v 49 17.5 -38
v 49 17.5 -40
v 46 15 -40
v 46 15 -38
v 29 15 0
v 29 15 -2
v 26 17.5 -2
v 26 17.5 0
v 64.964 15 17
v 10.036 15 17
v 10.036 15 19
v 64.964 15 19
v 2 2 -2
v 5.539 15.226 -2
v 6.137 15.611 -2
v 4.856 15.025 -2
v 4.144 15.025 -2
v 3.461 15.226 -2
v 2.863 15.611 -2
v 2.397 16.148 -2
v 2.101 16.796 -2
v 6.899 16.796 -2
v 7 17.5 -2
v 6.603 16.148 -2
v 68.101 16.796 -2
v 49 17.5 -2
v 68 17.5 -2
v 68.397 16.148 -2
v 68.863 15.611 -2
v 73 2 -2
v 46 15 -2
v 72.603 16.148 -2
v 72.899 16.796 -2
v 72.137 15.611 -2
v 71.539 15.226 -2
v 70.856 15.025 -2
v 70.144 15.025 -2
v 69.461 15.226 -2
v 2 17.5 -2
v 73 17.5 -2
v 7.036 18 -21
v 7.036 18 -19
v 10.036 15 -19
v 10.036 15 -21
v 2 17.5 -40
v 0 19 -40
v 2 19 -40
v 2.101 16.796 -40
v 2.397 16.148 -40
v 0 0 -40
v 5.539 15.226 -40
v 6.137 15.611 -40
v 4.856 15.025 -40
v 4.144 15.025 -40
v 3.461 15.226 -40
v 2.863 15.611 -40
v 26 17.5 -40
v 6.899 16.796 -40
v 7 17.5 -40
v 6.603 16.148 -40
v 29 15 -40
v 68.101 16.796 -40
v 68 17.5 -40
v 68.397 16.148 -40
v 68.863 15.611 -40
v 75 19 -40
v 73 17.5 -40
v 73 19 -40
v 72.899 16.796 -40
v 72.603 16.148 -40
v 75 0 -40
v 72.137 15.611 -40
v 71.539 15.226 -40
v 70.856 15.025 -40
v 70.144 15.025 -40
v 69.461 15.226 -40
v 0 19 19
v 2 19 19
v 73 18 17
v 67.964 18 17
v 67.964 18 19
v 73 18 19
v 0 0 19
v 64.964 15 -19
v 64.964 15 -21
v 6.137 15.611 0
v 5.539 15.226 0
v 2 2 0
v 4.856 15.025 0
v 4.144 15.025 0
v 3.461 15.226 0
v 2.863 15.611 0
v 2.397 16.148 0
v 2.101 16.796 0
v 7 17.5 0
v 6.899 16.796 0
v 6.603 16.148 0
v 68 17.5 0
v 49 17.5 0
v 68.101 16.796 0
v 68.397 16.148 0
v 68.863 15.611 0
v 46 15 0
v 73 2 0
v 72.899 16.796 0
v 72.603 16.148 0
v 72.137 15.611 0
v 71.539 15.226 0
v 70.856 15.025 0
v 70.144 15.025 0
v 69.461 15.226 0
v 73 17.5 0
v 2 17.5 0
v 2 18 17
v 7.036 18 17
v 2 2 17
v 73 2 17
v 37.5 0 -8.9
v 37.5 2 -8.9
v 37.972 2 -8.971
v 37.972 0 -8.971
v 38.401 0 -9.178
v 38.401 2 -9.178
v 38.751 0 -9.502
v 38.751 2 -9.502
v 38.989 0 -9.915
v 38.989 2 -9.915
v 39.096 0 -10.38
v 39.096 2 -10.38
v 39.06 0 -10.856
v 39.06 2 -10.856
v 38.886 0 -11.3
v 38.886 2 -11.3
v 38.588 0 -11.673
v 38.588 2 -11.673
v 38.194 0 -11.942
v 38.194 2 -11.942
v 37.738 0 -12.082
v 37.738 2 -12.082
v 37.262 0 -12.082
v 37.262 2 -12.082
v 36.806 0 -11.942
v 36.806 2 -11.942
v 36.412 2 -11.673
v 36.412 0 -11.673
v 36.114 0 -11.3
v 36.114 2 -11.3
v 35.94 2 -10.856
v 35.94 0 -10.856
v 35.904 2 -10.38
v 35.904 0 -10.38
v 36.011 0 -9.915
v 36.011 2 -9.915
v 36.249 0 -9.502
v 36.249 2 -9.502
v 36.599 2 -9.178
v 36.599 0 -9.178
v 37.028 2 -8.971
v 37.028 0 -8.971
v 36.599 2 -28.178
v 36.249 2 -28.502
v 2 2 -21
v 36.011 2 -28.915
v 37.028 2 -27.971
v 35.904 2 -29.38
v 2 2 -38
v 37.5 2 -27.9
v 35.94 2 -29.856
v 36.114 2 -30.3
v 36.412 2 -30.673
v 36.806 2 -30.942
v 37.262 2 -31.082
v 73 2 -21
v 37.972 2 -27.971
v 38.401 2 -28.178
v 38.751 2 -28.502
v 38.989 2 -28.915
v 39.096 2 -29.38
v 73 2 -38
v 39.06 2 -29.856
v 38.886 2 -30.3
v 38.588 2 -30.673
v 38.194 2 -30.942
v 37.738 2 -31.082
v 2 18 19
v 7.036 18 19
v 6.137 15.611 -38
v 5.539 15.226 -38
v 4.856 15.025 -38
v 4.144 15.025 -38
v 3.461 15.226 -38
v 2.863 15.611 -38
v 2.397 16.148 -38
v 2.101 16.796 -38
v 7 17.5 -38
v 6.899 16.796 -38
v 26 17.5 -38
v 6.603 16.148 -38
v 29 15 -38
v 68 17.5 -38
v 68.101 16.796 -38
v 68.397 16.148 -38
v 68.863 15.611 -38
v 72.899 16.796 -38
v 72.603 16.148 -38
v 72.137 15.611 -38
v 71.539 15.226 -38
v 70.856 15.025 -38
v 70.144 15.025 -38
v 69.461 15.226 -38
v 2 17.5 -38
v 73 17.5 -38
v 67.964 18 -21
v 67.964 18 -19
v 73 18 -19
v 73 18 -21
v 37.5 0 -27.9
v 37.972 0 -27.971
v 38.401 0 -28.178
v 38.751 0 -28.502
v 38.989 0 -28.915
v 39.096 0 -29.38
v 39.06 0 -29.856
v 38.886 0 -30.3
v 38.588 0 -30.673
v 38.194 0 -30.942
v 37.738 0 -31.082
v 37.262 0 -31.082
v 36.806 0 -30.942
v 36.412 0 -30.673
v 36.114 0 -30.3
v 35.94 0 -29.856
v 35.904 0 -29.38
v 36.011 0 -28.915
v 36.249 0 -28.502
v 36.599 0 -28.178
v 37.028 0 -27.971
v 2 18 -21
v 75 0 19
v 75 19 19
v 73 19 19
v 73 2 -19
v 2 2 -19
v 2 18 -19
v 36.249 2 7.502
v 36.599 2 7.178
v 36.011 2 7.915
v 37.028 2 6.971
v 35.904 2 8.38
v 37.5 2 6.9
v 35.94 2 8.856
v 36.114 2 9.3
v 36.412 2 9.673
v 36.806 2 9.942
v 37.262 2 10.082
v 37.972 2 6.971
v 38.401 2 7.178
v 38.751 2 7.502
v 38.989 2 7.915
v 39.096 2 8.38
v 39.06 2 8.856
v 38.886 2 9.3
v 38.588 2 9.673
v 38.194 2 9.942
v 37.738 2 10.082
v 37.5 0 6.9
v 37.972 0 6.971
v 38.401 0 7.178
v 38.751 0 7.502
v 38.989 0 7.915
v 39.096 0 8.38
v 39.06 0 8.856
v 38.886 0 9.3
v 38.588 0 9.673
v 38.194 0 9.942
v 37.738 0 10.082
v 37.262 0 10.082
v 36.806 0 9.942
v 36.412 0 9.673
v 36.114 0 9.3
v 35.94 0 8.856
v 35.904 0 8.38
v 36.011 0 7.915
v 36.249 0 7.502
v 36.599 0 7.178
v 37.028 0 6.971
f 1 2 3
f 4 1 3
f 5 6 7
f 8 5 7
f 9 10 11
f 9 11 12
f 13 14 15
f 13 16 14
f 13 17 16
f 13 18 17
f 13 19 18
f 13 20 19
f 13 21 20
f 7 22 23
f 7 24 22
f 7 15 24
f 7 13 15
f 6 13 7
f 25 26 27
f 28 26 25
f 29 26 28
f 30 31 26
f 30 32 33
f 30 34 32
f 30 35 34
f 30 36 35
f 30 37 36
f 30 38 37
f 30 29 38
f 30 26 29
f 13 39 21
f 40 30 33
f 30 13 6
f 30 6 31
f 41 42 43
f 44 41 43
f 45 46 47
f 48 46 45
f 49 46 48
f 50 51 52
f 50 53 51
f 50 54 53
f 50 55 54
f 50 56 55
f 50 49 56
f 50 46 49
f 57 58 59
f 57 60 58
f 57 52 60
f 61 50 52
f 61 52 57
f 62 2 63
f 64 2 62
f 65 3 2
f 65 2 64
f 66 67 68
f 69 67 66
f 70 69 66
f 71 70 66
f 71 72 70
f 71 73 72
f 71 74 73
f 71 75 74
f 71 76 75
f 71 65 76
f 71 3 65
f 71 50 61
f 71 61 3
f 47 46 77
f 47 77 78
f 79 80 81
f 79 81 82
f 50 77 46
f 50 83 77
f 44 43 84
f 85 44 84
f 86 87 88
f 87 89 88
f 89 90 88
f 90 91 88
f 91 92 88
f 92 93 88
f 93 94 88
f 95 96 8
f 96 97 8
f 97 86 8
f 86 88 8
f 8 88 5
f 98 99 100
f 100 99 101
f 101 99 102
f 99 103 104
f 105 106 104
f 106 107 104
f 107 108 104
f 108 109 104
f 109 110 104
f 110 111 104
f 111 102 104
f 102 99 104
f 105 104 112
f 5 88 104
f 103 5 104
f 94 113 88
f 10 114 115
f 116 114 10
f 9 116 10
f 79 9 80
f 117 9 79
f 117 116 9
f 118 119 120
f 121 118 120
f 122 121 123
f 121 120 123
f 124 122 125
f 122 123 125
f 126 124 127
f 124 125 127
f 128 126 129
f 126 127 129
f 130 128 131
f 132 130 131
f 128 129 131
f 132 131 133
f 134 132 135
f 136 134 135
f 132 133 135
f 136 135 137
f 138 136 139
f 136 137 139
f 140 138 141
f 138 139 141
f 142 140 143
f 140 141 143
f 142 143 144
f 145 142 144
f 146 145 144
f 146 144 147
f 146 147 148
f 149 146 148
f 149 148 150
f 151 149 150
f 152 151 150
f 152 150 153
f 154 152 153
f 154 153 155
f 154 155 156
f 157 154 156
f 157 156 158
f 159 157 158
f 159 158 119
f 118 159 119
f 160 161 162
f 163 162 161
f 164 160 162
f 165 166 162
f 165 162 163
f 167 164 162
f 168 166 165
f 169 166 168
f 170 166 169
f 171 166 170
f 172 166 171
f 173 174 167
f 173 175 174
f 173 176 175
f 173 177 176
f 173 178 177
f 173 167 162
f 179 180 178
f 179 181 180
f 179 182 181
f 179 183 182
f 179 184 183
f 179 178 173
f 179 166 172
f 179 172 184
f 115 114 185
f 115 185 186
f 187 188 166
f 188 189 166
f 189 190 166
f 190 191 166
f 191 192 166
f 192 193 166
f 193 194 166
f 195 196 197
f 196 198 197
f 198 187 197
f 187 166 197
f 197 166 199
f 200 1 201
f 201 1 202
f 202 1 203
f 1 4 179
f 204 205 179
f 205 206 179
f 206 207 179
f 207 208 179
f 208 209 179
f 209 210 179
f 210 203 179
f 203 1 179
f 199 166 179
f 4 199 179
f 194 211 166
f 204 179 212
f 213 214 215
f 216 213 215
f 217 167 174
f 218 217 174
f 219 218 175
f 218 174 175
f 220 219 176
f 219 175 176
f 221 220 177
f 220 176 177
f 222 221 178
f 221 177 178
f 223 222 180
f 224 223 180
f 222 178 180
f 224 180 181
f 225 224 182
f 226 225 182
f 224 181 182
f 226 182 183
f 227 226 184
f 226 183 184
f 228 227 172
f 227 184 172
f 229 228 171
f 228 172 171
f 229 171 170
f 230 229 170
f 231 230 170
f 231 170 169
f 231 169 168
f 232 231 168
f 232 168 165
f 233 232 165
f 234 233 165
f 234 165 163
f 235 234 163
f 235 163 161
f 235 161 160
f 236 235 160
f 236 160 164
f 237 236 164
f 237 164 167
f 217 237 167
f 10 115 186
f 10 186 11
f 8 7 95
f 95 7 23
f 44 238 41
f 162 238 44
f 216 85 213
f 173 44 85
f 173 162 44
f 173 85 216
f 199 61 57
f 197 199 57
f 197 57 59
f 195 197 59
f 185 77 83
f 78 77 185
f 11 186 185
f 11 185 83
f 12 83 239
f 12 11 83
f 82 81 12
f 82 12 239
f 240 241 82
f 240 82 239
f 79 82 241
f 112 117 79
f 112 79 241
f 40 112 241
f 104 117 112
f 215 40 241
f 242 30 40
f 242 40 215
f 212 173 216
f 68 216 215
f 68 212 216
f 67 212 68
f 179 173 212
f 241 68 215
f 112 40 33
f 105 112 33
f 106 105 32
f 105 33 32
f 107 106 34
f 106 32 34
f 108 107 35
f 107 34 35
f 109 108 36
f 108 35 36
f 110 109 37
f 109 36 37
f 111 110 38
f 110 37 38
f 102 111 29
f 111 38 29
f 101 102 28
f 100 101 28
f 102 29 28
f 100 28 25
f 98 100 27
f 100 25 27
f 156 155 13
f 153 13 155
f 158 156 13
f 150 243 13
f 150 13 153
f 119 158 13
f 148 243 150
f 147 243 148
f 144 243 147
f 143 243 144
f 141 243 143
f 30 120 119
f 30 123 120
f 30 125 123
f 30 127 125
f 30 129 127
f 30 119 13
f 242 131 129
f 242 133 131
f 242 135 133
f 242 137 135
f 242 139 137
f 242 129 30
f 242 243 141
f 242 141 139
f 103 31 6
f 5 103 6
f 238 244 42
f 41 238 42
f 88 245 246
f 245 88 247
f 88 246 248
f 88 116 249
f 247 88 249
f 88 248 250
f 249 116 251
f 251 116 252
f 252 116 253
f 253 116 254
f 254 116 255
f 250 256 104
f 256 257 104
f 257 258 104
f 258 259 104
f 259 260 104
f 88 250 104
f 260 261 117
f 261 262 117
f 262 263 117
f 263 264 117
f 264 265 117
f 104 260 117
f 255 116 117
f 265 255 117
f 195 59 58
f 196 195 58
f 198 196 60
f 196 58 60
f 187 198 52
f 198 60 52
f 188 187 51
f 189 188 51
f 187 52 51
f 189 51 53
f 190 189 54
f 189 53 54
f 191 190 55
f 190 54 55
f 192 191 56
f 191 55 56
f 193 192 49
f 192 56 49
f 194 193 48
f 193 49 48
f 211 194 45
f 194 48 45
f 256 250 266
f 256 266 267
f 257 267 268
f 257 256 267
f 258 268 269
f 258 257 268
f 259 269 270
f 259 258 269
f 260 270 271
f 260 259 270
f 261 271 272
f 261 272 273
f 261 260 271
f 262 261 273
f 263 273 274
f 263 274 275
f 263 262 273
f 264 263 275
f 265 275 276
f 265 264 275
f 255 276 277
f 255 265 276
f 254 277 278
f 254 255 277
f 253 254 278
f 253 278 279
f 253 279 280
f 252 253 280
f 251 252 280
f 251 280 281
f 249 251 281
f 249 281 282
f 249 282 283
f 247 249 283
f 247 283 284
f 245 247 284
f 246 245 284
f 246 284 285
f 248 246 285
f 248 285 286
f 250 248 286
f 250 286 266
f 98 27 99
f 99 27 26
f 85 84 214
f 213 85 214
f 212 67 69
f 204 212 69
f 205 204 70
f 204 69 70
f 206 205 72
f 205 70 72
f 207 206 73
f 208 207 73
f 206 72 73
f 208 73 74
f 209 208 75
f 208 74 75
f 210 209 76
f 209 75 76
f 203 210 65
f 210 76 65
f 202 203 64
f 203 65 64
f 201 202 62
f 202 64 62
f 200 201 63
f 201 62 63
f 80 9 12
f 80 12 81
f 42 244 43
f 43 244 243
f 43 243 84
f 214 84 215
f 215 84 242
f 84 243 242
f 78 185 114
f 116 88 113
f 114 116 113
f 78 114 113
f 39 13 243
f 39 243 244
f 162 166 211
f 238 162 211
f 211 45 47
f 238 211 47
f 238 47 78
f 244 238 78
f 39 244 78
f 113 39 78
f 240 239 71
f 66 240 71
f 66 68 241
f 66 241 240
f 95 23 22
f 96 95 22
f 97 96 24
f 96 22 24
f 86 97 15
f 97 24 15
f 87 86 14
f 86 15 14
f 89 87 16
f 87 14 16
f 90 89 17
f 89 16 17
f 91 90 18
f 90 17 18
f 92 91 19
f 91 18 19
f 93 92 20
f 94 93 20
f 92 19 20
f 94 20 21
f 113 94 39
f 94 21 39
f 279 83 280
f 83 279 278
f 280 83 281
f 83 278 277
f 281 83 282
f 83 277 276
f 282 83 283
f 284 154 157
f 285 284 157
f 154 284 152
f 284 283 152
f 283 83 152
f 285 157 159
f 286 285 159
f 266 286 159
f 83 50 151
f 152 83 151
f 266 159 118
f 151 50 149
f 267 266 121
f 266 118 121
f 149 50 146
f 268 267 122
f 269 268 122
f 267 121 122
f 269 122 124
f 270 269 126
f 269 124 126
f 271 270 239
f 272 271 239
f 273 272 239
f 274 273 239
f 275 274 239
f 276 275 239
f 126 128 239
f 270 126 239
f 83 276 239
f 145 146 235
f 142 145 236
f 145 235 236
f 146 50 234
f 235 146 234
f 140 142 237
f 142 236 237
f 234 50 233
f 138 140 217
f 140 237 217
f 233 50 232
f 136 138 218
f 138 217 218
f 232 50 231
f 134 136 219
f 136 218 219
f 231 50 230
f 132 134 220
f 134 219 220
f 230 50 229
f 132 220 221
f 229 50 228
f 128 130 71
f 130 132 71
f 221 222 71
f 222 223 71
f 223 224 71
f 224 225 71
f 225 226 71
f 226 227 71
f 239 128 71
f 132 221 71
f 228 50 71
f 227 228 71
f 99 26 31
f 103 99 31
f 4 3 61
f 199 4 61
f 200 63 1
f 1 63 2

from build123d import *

# Parameters (mm, degrees)
SKETCH1_W            = 75
SKETCH1_H            = 40
BOSS_EXTRUDE1_DEPTH  = 2
SKETCH2_W            = 75
SKETCH2_H            = 40
SKETCH2_W_2          = 71
SKETCH2_H_2          = 17
BOSS_EXTRUDE2_DEPTH  = 17
CUT_EXTRUDE2_DEPTH   = 17
CUT_EXTRUDE3_REACH   = 82.169
CUT_EXTRUDE4_REACH   = 88.683
SKETCH5_R            = 1.6
MIRROR2_COPY_1_DEPTH = 17
SKETCH7_W            = 80.259890461
SKETCH7_H            = 23.370696072
CUT_EXTRUDE5_DEPTH   = 19


with BuildPart() as part:
    # Sketch1 → Boss-Extrude1 (new body)
    with BuildSketch(Plane(origin=(0, 0, 0), x_dir=(1, 0, 0), z_dir=(0, 1, 0))):
        with Locations((37.5, 20)):
            Rectangle(SKETCH1_W, SKETCH1_H)
    boss_extrude1 = extrude(amount=BOSS_EXTRUDE1_DEPTH)

    # Sketch2 → Boss-Extrude2 (add)
    with BuildSketch(Plane(origin=(0, 2, 0), x_dir=(1, 0, 0), z_dir=(0, 1, 0))):
        with Locations((37.5, 20)):
            Rectangle(SKETCH2_W, SKETCH2_H)
        with Locations((37.5, 29.5)):
            Rectangle(SKETCH2_W_2, SKETCH2_H_2, mode=Mode.SUBTRACT)
        with Locations((37.5, 10.5)):
            Rectangle(SKETCH2_W_2, SKETCH2_H_2, mode=Mode.SUBTRACT)
    boss_extrude2 = extrude(amount=BOSS_EXTRUDE2_DEPTH)

    # Sketch3 → Cut-Extrude2 (cut)
    with BuildSketch(Plane.XY):
        with BuildLine():
            Line((2, 17.5), (2, 19))
            Line((2, 19), (73, 19))
            Line((73, 19), (73, 17.5))
            ThreePointArc((73, 17.5), (70.5, 15), (68, 17.5))
            Line((68, 17.5), (49, 17.5))
            Line((49, 17.5), (46, 15))
            Line((46, 15), (29, 15))
            Line((29, 15), (26, 17.5))
            Line((26, 17.5), (7, 17.5))
            ThreePointArc((7, 17.5), (4.5, 15), (2, 17.5))
        make_face()
    cut_extrude2 = extrude(amount=-CUT_EXTRUDE2_DEPTH, mode=Mode.SUBTRACT)

    # Mirror1: Cut-Extrude2 across plane
    add(cut_extrude2.mirror(Plane.XY.offset(-20)), mode=Mode.SUBTRACT)

    # Sketch4 → Cut-Extrude3 (cut, up to next)
    with BuildSketch(Plane.XY.offset(-19), mode=Mode.PRIVATE) as cut_extrude3_sk1:
        Polygon((2, 18), (7.035918341, 18), (10.035918341, 15), (64.964081659, 15), (67.964081659, 18), (73, 18), (73, 19), (2, 19), align=None)
    cut_extrude3_tool1 = extrude(cut_extrude3_sk1.sketch, amount=-CUT_EXTRUDE3_REACH, mode=Mode.PRIVATE) & part.part
    cut_extrude3 = cut_extrude3_tool1.solids().sort_by_distance((37.5, 17.098486, -19))[0]
    add(cut_extrude3, mode=Mode.SUBTRACT)

    # Sketch5 → Cut-Extrude4 (cut, up to next)
    with BuildSketch(Plane(origin=(0, 2, 0), x_dir=(1, 0, 0), z_dir=(0, 1, 0)), mode=Mode.PRIVATE) as cut_extrude4_sk1:
        with Locations(Location((37.5, 29.5, 0), (0, 0, 270))):
            Circle(SKETCH5_R)
    cut_extrude4_tool1 = extrude(cut_extrude4_sk1.sketch, amount=-CUT_EXTRUDE4_REACH, mode=Mode.PRIVATE) & part.part
    # Sketch5 → Cut-Extrude4 (cut, up to next)
    with BuildSketch(Plane(origin=(0, 2, 0), x_dir=(1, 0, 0), z_dir=(0, 1, 0)), mode=Mode.PRIVATE) as cut_extrude4_sk2:
        with Locations(Location((37.5, 10.5, 0), (0, 0, 270))):
            Circle(SKETCH5_R)
    cut_extrude4_tool2 = extrude(cut_extrude4_sk2.sketch, amount=-CUT_EXTRUDE4_REACH, mode=Mode.PRIVATE) & part.part
    cut_extrude4_1 = cut_extrude4_tool1.solids().sort_by_distance((37.5, 2, -29.5))[0]
    add(cut_extrude4_1, mode=Mode.SUBTRACT)
    cut_extrude4_2 = cut_extrude4_tool2.solids().sort_by_distance((37.5, 2, -10.5))[0]
    add(cut_extrude4_2, mode=Mode.SUBTRACT)
    cut_extrude4 = cut_extrude4_1 + cut_extrude4_2  # Cut-Extrude4 as one shape, for the pattern or mirror that repeats it

    # Mirror2: Boss-Extrude1, Boss-Extrude2, Cut-Extrude2, Cut-Extrude3, Cut-Extrude4 across plane
    add(boss_extrude1.mirror(Plane.XY.offset(-1)))
    add(boss_extrude2.mirror(Plane.XY.offset(-1)))
    add(cut_extrude2.mirror(Plane.XY.offset(-1)), mode=Mode.SUBTRACT)
    add(cut_extrude3.mirror(Plane.XY.offset(-1)), mode=Mode.SUBTRACT)
    add(cut_extrude4.mirror(Plane.XY.offset(-1)), mode=Mode.SUBTRACT)

    # Mirror2 copy 1 sketch → Mirror2 copy 1 (cut)
    with BuildSketch(Plane.XY.offset(38)):
        with BuildLine():
            Line((2, 17.5), (2, 19))
            Line((2, 19), (73, 19))
            Line((73, 19), (73, 17.5))
            ThreePointArc((73, 17.5), (70.5, 15), (68, 17.5))
            Line((68, 17.5), (49, 17.5))
            Line((49, 17.5), (46, 15))
            Line((46, 15), (29, 15))
            Line((29, 15), (26, 17.5))
            Line((26, 17.5), (7, 17.5))
            ThreePointArc((7, 17.5), (4.5, 15), (2, 17.5))
        make_face()
    extrude(amount=-MIRROR2_COPY_1_DEPTH, mode=Mode.SUBTRACT)

    # Sketch7 → Cut-Extrude5 (cut)
    with BuildSketch(Plane.XY.offset(38)):
        with Locations((37.807509159, 10.038141028)):
            Rectangle(SKETCH7_W, SKETCH7_H)
    extrude(amount=-CUT_EXTRUDE5_DEPTH, mode=Mode.SUBTRACT)


solid = part.part
